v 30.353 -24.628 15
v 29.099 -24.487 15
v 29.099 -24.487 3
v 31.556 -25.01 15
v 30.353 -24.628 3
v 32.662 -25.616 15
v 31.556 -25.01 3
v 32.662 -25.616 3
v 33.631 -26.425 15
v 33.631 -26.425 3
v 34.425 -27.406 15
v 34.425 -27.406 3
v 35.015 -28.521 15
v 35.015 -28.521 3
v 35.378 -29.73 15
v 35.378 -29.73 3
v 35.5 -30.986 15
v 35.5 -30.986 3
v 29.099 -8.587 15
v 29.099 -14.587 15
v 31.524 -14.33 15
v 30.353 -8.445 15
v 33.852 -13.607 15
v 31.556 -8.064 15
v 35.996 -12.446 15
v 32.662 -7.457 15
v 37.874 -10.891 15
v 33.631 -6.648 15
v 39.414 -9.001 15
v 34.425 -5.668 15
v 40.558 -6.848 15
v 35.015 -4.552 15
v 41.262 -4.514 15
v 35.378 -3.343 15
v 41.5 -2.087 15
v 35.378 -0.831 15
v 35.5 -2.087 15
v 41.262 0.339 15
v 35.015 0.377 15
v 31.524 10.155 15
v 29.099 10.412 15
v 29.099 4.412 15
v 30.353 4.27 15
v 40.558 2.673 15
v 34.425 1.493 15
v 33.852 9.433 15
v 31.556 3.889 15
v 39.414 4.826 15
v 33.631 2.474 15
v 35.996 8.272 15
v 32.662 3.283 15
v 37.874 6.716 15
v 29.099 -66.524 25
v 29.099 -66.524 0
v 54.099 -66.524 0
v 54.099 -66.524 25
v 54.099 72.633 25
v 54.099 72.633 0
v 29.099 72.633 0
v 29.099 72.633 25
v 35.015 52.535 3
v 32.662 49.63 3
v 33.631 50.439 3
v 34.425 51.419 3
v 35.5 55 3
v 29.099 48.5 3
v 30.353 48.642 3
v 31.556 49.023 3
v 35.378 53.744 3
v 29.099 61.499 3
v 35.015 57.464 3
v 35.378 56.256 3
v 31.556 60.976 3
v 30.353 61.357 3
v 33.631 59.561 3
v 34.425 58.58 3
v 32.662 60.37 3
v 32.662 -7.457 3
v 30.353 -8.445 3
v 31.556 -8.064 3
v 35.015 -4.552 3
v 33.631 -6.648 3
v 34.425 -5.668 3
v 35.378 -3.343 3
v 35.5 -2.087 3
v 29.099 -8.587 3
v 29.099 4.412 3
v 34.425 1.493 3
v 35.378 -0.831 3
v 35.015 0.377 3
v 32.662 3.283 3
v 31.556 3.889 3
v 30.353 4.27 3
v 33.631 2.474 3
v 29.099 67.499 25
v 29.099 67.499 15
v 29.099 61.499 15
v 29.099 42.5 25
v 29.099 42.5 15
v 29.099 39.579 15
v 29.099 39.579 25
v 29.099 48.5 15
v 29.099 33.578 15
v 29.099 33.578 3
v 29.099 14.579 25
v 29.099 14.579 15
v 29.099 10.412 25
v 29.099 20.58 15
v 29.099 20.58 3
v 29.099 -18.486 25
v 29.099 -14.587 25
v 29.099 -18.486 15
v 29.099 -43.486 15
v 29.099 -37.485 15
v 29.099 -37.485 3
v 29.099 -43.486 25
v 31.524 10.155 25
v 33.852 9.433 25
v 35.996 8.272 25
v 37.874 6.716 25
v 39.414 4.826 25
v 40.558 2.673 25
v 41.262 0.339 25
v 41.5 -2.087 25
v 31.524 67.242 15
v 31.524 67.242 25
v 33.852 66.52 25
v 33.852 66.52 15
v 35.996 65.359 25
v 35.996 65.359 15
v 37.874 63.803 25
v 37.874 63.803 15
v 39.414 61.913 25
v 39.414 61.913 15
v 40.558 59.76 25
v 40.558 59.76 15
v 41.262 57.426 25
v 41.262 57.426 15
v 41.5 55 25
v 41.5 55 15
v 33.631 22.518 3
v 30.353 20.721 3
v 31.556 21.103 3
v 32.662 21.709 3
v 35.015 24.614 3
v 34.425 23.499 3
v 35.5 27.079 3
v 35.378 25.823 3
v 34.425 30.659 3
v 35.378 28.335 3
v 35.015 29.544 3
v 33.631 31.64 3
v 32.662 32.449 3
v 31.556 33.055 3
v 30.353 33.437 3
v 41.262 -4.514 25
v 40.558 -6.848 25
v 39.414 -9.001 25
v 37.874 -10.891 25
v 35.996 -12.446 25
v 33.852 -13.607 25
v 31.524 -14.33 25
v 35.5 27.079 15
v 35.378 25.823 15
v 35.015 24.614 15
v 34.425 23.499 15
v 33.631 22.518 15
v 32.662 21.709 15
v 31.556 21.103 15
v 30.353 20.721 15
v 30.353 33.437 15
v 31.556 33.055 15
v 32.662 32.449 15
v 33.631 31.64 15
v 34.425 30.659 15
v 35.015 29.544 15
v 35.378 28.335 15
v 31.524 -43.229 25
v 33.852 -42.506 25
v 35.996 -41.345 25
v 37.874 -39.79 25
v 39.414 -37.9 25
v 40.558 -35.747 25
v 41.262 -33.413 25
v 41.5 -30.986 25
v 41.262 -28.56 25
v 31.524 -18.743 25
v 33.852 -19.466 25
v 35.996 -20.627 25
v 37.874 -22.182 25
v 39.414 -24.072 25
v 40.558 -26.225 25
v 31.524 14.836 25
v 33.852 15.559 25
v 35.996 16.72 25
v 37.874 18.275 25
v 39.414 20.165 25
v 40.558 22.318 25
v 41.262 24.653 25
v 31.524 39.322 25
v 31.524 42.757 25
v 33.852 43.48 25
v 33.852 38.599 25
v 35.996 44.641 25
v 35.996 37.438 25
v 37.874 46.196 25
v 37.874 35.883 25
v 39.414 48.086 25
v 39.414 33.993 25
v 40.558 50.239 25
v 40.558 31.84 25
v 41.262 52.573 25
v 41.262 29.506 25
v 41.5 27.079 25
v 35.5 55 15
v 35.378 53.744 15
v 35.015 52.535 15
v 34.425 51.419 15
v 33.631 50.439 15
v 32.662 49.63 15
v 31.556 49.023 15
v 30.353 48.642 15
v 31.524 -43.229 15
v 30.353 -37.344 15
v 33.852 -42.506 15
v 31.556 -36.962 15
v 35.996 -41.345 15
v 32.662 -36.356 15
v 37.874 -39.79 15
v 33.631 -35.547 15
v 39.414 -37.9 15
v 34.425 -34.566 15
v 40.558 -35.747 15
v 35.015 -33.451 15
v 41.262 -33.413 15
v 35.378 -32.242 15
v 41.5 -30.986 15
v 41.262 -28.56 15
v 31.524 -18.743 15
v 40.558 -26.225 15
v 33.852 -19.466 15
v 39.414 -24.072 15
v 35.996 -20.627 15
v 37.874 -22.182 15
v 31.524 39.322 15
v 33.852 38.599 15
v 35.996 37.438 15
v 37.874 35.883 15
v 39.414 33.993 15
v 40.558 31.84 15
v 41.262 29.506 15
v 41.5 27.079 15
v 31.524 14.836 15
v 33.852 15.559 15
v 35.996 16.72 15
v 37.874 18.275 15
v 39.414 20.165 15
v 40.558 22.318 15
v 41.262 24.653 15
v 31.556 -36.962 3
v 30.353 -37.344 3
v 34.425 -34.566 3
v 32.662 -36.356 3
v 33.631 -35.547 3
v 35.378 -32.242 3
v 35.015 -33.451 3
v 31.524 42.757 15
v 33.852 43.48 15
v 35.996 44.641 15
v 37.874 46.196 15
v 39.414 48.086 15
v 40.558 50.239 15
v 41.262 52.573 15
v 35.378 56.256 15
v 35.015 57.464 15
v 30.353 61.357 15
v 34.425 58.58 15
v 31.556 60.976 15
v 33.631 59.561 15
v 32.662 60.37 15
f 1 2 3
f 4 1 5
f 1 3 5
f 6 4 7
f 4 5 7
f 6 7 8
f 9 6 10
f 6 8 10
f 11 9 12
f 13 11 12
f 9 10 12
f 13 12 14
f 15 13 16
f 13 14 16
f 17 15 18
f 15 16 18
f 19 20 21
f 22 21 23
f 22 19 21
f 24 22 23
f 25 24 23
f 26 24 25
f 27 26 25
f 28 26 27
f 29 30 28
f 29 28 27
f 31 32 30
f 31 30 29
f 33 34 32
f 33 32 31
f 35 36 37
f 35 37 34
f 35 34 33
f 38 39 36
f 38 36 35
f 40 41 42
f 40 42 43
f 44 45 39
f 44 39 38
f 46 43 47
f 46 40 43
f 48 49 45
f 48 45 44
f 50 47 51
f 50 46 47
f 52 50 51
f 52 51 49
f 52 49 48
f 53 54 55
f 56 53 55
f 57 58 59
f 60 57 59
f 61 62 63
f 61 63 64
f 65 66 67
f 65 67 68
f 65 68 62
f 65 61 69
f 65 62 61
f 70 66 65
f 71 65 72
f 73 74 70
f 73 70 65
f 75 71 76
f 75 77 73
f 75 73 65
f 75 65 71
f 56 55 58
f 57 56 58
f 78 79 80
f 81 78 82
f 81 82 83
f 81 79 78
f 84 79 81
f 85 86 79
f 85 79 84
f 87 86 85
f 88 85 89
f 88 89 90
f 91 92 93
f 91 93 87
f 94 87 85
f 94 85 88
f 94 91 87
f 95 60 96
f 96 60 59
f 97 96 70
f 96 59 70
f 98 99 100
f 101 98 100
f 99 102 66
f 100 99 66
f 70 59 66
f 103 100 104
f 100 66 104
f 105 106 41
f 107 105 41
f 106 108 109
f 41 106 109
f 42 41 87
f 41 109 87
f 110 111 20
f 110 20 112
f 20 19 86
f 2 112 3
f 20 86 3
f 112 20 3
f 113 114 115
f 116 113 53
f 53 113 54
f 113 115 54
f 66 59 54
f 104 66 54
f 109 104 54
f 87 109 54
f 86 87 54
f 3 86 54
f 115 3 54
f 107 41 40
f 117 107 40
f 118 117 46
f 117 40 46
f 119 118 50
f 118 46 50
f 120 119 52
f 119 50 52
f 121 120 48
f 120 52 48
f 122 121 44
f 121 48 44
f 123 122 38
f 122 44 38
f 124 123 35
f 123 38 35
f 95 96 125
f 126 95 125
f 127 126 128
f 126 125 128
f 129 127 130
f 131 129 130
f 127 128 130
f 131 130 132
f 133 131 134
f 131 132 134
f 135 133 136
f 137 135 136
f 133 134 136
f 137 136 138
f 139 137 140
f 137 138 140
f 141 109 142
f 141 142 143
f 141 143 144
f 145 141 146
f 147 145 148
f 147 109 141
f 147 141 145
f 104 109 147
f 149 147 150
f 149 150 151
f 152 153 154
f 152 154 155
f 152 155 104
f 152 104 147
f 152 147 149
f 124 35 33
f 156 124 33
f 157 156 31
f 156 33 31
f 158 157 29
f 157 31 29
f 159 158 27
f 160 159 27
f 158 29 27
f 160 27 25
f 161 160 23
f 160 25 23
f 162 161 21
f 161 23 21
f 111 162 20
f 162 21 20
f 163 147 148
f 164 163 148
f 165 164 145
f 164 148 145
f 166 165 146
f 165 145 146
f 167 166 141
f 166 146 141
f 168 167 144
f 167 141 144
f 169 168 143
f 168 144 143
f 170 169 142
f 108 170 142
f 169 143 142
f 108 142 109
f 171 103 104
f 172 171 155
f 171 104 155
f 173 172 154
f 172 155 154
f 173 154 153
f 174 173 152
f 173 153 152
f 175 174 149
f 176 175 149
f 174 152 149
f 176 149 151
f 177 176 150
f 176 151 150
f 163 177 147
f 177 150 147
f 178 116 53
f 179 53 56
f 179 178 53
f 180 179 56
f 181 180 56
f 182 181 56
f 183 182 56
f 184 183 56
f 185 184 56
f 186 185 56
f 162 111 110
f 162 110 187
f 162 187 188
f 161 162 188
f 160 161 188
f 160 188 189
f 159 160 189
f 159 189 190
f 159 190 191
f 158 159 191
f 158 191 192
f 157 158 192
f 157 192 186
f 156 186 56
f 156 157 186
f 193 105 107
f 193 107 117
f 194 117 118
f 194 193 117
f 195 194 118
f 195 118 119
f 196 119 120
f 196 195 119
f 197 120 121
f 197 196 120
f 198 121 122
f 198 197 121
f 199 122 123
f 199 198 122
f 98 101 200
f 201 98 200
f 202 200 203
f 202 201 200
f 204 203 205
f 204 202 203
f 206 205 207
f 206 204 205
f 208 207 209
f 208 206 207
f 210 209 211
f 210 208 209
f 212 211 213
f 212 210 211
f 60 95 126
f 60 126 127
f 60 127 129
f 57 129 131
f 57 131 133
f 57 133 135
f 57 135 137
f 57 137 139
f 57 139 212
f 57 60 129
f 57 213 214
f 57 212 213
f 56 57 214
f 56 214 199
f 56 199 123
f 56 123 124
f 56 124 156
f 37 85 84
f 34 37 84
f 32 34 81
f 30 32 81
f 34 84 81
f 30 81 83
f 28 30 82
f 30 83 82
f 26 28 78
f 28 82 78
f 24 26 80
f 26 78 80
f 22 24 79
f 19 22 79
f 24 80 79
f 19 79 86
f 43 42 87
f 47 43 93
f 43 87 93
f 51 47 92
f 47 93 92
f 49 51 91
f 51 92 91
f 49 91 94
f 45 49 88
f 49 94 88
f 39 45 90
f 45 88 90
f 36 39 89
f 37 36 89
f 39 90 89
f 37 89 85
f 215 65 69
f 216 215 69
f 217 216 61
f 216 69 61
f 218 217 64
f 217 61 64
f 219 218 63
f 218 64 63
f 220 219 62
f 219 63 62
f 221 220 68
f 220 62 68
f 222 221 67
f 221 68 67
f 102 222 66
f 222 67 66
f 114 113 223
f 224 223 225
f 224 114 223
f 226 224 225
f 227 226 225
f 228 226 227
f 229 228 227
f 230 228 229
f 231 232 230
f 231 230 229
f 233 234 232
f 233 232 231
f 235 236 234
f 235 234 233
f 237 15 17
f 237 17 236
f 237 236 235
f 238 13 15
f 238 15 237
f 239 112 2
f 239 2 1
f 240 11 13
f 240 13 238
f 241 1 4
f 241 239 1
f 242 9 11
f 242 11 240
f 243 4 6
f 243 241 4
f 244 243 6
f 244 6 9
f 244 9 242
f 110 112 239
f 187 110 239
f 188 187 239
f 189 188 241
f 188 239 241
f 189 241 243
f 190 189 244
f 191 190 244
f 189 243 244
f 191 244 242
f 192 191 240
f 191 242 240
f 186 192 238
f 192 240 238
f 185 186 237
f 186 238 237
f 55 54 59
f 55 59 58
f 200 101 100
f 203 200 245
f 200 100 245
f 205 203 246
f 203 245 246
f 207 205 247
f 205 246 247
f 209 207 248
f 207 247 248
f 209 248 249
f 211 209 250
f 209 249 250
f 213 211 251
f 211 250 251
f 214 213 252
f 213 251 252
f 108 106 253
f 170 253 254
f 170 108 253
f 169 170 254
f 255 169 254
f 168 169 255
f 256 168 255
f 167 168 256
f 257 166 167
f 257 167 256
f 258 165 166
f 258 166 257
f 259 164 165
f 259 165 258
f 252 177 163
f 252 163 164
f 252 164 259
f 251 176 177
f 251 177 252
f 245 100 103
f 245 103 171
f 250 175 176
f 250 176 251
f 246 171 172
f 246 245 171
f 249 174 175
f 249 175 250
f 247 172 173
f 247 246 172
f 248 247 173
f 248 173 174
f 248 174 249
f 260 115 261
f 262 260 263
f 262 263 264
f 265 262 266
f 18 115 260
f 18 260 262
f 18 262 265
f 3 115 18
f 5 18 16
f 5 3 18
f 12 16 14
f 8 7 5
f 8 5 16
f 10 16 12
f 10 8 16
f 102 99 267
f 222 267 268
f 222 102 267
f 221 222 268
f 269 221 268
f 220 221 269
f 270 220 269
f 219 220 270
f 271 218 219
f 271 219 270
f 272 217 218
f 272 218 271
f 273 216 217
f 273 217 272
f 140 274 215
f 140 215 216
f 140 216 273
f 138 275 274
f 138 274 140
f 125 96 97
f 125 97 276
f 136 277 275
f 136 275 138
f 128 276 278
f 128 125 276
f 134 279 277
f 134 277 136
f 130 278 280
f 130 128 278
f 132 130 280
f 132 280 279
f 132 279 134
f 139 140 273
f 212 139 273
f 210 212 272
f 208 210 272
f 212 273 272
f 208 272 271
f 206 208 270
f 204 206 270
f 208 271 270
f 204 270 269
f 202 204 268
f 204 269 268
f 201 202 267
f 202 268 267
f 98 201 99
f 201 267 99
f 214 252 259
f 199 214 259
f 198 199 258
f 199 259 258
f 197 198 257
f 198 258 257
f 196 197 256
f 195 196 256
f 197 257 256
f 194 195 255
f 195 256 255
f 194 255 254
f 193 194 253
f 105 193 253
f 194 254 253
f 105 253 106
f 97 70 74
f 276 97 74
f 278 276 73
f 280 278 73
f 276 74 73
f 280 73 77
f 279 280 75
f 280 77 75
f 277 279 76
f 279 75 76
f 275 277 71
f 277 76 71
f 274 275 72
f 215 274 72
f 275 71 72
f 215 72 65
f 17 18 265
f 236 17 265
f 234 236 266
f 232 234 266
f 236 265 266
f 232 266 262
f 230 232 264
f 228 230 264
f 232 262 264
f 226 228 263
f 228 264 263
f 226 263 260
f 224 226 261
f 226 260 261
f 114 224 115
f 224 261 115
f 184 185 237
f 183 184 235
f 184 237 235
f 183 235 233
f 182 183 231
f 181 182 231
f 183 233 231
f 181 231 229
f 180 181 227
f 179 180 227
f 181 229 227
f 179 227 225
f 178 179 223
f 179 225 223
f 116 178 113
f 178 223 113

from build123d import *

# Parameters (mm, degrees)
F1_DEPTH = 25
F2_DEPTH = 3
F3_DEPTH = 15
F4_W     = 25
F4_H     = 139.1576522589
F5_DEPTH = 3


with BuildPart() as f1:
    # F0 (on Top) → F1 (new body)
    with BuildSketch(Plane.XY):
        with BuildLine():
            Line((54.0989699066, 72.6331850421), (29.0989699066, 72.6331850421))
            Line((29.0989699066, 72.6331850421), (29.0989699066, 67.49929167))
            ThreePointArc((29.0989699066, 67.49929167), (37.8737569223, 63.8034575596), (41.5, 54.9996834778))
            ThreePointArc((41.5, 54.9996834778), (37.8737569223, 46.195909396), (29.0989699066, 42.5000752856))
            Line((29.0989699066, 42.5000752856), (29.0989699066, 39.5786203772))
            ThreePointArc((29.0989699066, 39.5786203772), (37.8737569223, 35.8827862669), (41.5, 27.079012185))
            ThreePointArc((41.5, 27.079012185), (37.8737569223, 18.2752381032), (29.0989699066, 14.5794039929))
            Line((29.0989699066, 14.5794039929), (29.0989699066, 10.4122504635))
            ThreePointArc((29.0989699066, 10.4122504635), (37.8737569223, 6.7164163532), (41.5, -2.0873577287))
            ThreePointArc((41.5, -2.0873577287), (37.8737569223, -10.8911318105), (29.0989699066, -14.5869659208))
            Line((29.0989699066, -14.5869659208), (29.0989699066, -18.4864327763))
            ThreePointArc((29.0989699066, -18.4864327763), (37.8737569223, -22.1822668866), (41.5, -30.9860409684))
            ThreePointArc((41.5, -30.9860409684), (37.8737569223, -39.7898150502), (29.0989699066, -43.4856491606))
            Line((29.0989699066, -43.4856491606), (29.0989699066, -66.5244672167))
            Line((29.0989699066, -66.5244672167), (54.0989699066, -66.5244672167))
            Line((54.0989699066, -66.5244672167), (54.0989699066, 72.6331850421))
        make_face()
    extrude(amount=F1_DEPTH)



with BuildPart() as f2:
    # F0 (on Top) → F2 (new body)
    with BuildSketch(Plane.XY):
        with BuildLine():
            ThreePointArc((35.5, 54.9996834778), (33.6310530332, 59.5607521907), (29.0989699066, 61.4989299693))
            Line((29.0989699066, 61.4989299693), (29.0989699066, 48.5004369863))
            ThreePointArc((29.0989699066, 48.5004369863), (33.6310530332, 50.4386147649), (35.5, 54.9996834778))
        make_face()
    extrude(amount=F2_DEPTH)


with BuildPart() as f2b:
    # F0 (on Top) → F2, piece 2 (new body)
    with BuildSketch(Plane.XY):
        with BuildLine():
            ThreePointArc((35.5, 27.079012185), (33.6310530332, 31.6400808979), (29.0989699066, 33.5782586765))
            Line((29.0989699066, 33.5782586765), (29.0989699066, 20.5797656935))
            ThreePointArc((29.0989699066, 20.5797656935), (33.6310530332, 22.5179434721), (35.5, 27.079012185))
        make_face()
    extrude(amount=F2_DEPTH)


with BuildPart() as f2c:
    # F0 (on Top) → F2, piece 3 (new body)
    with BuildSketch(Plane.XY):
        with BuildLine():
            Line((29.0989699066, 4.4118887628), (29.0989699066, -8.5866042202))
            ThreePointArc((29.0989699066, -8.5866042202), (33.6310530332, -6.6484264416), (35.5, -2.0873577287))
            ThreePointArc((35.5, -2.0873577287), (33.6310530332, 2.4737109842), (29.0989699066, 4.4118887628))
        make_face()
    extrude(amount=F2_DEPTH)


with BuildPart() as f2d:
    # F0 (on Top) → F2, piece 4 (new body)
    with BuildSketch(Plane.XY):
        with BuildLine():
            Line((29.0989699066, -24.4867944769), (29.0989699066, -37.4852874599))
            ThreePointArc((29.0989699066, -37.4852874599), (33.6310530332, -35.5471096813), (35.5, -30.9860409684))
            ThreePointArc((35.5, -30.9860409684), (33.6310530332, -26.4249722555), (29.0989699066, -24.4867944769))
        make_face()
    extrude(amount=F2_DEPTH)


with BuildPart() as f1_1:
    add(f1.part)

    add(f2.part)  # F3 merges F2

    add(f2b.part)  # F3 merges F2b

    add(f2c.part)  # F3 merges F2c

    add(f2d.part)  # F3 merges F2d
    # F0 (on Top) → F3 (join)
    with BuildSketch(Plane.XY):
        with BuildLine():
            ThreePointArc((41.5, 54.9996834778), (37.8737569223, 63.8034575596), (29.0989699066, 67.49929167))
            Line((29.0989699066, 67.49929167), (29.0989699066, 61.4989299693))
            ThreePointArc((29.0989699066, 61.4989299693), (33.6310530332, 59.5607521907), (35.5, 54.9996834778))
            ThreePointArc((35.5, 54.9996834778), (33.6310530332, 50.4386147649), (29.0989699066, 48.5004369863))
            Line((29.0989699066, 48.5004369863), (29.0989699066, 42.5000752856))
            ThreePointArc((29.0989699066, 42.5000752856), (37.8737569223, 46.195909396), (41.5, 54.9996834778))
        make_face()
        with BuildLine():
            ThreePointArc((41.5, 27.079012185), (37.8737569223, 35.8827862669), (29.0989699066, 39.5786203772))
            Line((29.0989699066, 39.5786203772), (29.0989699066, 33.5782586765))
            ThreePointArc((29.0989699066, 33.5782586765), (33.6310530332, 31.6400808979), (35.5, 27.079012185))
            ThreePointArc((35.5, 27.079012185), (33.6310530332, 22.5179434721), (29.0989699066, 20.5797656935))
            Line((29.0989699066, 20.5797656935), (29.0989699066, 14.5794039929))
            ThreePointArc((29.0989699066, 14.5794039929), (37.8737569223, 18.2752381032), (41.5, 27.079012185))
        make_face()
        with BuildLine():
            Line((29.0989699066, -8.5866042202), (29.0989699066, -14.5869659208))
            ThreePointArc((29.0989699066, -14.5869659208), (37.8737569223, -10.8911318105), (41.5, -2.0873577287))
            ThreePointArc((41.5, -2.0873577287), (37.8737569223, 6.7164163532), (29.0989699066, 10.4122504635))
            Line((29.0989699066, 10.4122504635), (29.0989699066, 4.4118887628))
            ThreePointArc((29.0989699066, 4.4118887628), (33.6310530332, 2.4737109842), (35.5, -2.0873577287))
            ThreePointArc((35.5, -2.0873577287), (33.6310530332, -6.6484264416), (29.0989699066, -8.5866042202))
        make_face()
        with BuildLine():
            Line((29.0989699066, -37.4852874599), (29.0989699066, -43.4856491606))
            ThreePointArc((29.0989699066, -43.4856491606), (37.8737569223, -39.7898150502), (41.5, -30.9860409684))
            ThreePointArc((41.5, -30.9860409684), (37.8737569223, -22.1822668866), (29.0989699066, -18.4864327763))
            Line((29.0989699066, -18.4864327763), (29.0989699066, -24.4867944769))
            ThreePointArc((29.0989699066, -24.4867944769), (33.6310530332, -26.4249722555), (35.5, -30.9860409684))
            ThreePointArc((35.5, -30.9860409684), (33.6310530332, -35.5471096813), (29.0989699066, -37.4852874599))
        make_face()
    extrude(amount=F3_DEPTH)

    # F4 (on face) → F5 (join)
    with BuildSketch(Plane(origin=(0, 0, 0), x_dir=(1, 0, 0), z_dir=(0, 0, -1))):
        with Locations((41.5989699066, -3.0543589127)):
            Rectangle(F4_W, F4_H)
    extrude(amount=-F5_DEPTH)


solid = f1_1.part
